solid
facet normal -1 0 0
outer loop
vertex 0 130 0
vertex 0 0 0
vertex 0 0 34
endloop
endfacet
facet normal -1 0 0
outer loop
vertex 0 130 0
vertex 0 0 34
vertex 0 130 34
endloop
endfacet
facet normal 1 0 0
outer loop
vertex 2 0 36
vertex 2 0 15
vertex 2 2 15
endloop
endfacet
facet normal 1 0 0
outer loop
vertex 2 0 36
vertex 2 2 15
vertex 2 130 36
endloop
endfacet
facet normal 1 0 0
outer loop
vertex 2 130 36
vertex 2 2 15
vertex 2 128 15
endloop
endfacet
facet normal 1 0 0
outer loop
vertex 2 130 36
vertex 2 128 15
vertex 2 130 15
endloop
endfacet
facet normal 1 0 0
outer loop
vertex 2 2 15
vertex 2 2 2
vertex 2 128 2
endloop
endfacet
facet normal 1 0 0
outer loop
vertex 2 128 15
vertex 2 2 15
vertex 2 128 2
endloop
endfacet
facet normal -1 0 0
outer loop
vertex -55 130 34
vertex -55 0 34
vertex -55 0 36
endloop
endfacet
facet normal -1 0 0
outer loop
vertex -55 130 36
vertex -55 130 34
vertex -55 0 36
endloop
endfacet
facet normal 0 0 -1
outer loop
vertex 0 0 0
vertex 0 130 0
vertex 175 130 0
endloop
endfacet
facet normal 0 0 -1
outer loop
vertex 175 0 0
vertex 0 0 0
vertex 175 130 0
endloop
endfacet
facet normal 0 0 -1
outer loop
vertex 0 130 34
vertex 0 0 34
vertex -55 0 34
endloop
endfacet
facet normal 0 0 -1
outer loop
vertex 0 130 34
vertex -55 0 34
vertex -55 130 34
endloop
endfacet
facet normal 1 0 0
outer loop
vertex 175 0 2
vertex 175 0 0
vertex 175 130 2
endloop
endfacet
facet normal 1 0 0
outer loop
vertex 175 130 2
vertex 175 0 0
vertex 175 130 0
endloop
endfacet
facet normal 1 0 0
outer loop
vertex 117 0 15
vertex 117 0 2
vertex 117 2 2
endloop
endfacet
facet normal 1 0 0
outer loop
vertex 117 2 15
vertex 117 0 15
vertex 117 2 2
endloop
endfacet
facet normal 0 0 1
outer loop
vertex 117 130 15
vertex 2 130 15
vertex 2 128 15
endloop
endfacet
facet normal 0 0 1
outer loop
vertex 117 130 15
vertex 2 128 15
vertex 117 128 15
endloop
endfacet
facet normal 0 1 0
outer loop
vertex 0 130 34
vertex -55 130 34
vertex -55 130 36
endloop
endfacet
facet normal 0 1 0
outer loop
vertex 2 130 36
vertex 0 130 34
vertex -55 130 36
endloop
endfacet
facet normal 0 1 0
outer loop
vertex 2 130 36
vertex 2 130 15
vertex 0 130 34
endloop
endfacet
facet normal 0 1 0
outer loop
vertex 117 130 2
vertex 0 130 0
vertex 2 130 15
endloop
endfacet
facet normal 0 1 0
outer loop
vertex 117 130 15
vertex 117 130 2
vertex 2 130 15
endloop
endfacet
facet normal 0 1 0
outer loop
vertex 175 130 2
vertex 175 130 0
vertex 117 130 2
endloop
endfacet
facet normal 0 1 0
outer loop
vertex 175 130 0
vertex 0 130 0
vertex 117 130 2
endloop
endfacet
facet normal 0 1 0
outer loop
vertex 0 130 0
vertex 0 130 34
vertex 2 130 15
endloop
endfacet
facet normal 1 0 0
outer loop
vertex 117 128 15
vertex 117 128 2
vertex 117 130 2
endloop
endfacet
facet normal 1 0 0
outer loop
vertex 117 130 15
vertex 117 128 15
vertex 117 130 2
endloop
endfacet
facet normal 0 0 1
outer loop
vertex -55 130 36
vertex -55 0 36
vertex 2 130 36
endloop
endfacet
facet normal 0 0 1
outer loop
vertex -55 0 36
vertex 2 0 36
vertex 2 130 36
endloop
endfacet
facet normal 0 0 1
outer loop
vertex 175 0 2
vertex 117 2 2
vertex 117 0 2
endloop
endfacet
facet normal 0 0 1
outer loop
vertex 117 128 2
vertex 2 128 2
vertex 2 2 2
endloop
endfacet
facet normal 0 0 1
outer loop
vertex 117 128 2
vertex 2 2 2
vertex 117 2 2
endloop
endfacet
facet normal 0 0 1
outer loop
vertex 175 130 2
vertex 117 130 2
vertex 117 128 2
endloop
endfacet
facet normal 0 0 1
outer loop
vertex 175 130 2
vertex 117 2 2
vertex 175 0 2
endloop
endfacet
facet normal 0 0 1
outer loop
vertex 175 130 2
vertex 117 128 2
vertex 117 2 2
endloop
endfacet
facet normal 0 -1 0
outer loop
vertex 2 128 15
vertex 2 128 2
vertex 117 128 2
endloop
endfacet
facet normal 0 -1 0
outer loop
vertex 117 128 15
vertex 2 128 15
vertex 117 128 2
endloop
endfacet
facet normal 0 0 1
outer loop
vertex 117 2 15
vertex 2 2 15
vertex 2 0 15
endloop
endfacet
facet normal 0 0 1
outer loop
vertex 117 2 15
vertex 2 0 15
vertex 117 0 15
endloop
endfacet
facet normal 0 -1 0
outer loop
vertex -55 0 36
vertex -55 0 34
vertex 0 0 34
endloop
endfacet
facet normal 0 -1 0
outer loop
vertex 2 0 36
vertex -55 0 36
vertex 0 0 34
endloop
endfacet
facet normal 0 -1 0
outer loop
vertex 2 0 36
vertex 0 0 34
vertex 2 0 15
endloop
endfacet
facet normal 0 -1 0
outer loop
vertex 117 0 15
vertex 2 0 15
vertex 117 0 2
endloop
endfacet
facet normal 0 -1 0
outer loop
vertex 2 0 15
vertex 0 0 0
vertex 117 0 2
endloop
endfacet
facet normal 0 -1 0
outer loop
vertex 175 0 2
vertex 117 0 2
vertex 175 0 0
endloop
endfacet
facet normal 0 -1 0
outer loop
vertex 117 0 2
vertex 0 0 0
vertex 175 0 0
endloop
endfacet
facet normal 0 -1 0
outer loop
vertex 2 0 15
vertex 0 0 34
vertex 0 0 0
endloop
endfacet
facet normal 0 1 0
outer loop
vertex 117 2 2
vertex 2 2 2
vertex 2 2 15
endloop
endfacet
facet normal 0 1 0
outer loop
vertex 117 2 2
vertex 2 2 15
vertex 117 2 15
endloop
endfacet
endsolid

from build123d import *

# Parameters (mm, degrees)
SKETCH1_W           = 175
SKETCH1_H           = 130
BOSS_EXTRUDE1_DEPTH = 2
SKETCH2_W           = 2
SKETCH2_H           = 130
BOSS_EXTRUDE2_DEPTH = 34
SKETCH3_W           = 2
SKETCH3_H           = 130
BOSS_EXTRUDE4_DEPTH = 55
SKETCH5_W           = 115
SKETCH5_H           = 2
BOSS_EXTRUDE5_DEPTH = 13


with BuildPart() as part:
    # Sketch1 → Boss-Extrude1 (new body)
    with BuildSketch(Plane.XY):
        with Locations((87.5, 65)):
            Rectangle(SKETCH1_W, SKETCH1_H)
    extrude(amount=BOSS_EXTRUDE1_DEPTH)

    # Sketch2 → Boss-Extrude2 (add)
    with BuildSketch(Plane.XY.offset(2)):
        with Locations((1, 65)):
            Rectangle(SKETCH2_W, SKETCH2_H)
    extrude(amount=BOSS_EXTRUDE2_DEPTH)

    # Sketch3 → Boss-Extrude4 (add)
    with BuildSketch(Plane.ZY):
        with Locations((35, 65)):
            Rectangle(SKETCH3_W, SKETCH3_H)
    extrude(amount=BOSS_EXTRUDE4_DEPTH)

    # Sketch5 → Boss-Extrude5 (add)
    with BuildSketch(Plane.XY.offset(2)):
        with Locations((59.5, 1)):
            Rectangle(SKETCH5_W, SKETCH5_H)
        with Locations((59.5, 129)):
            Rectangle(SKETCH5_W, SKETCH5_H)
    extrude(amount=BOSS_EXTRUDE5_DEPTH)


solid = part.part
